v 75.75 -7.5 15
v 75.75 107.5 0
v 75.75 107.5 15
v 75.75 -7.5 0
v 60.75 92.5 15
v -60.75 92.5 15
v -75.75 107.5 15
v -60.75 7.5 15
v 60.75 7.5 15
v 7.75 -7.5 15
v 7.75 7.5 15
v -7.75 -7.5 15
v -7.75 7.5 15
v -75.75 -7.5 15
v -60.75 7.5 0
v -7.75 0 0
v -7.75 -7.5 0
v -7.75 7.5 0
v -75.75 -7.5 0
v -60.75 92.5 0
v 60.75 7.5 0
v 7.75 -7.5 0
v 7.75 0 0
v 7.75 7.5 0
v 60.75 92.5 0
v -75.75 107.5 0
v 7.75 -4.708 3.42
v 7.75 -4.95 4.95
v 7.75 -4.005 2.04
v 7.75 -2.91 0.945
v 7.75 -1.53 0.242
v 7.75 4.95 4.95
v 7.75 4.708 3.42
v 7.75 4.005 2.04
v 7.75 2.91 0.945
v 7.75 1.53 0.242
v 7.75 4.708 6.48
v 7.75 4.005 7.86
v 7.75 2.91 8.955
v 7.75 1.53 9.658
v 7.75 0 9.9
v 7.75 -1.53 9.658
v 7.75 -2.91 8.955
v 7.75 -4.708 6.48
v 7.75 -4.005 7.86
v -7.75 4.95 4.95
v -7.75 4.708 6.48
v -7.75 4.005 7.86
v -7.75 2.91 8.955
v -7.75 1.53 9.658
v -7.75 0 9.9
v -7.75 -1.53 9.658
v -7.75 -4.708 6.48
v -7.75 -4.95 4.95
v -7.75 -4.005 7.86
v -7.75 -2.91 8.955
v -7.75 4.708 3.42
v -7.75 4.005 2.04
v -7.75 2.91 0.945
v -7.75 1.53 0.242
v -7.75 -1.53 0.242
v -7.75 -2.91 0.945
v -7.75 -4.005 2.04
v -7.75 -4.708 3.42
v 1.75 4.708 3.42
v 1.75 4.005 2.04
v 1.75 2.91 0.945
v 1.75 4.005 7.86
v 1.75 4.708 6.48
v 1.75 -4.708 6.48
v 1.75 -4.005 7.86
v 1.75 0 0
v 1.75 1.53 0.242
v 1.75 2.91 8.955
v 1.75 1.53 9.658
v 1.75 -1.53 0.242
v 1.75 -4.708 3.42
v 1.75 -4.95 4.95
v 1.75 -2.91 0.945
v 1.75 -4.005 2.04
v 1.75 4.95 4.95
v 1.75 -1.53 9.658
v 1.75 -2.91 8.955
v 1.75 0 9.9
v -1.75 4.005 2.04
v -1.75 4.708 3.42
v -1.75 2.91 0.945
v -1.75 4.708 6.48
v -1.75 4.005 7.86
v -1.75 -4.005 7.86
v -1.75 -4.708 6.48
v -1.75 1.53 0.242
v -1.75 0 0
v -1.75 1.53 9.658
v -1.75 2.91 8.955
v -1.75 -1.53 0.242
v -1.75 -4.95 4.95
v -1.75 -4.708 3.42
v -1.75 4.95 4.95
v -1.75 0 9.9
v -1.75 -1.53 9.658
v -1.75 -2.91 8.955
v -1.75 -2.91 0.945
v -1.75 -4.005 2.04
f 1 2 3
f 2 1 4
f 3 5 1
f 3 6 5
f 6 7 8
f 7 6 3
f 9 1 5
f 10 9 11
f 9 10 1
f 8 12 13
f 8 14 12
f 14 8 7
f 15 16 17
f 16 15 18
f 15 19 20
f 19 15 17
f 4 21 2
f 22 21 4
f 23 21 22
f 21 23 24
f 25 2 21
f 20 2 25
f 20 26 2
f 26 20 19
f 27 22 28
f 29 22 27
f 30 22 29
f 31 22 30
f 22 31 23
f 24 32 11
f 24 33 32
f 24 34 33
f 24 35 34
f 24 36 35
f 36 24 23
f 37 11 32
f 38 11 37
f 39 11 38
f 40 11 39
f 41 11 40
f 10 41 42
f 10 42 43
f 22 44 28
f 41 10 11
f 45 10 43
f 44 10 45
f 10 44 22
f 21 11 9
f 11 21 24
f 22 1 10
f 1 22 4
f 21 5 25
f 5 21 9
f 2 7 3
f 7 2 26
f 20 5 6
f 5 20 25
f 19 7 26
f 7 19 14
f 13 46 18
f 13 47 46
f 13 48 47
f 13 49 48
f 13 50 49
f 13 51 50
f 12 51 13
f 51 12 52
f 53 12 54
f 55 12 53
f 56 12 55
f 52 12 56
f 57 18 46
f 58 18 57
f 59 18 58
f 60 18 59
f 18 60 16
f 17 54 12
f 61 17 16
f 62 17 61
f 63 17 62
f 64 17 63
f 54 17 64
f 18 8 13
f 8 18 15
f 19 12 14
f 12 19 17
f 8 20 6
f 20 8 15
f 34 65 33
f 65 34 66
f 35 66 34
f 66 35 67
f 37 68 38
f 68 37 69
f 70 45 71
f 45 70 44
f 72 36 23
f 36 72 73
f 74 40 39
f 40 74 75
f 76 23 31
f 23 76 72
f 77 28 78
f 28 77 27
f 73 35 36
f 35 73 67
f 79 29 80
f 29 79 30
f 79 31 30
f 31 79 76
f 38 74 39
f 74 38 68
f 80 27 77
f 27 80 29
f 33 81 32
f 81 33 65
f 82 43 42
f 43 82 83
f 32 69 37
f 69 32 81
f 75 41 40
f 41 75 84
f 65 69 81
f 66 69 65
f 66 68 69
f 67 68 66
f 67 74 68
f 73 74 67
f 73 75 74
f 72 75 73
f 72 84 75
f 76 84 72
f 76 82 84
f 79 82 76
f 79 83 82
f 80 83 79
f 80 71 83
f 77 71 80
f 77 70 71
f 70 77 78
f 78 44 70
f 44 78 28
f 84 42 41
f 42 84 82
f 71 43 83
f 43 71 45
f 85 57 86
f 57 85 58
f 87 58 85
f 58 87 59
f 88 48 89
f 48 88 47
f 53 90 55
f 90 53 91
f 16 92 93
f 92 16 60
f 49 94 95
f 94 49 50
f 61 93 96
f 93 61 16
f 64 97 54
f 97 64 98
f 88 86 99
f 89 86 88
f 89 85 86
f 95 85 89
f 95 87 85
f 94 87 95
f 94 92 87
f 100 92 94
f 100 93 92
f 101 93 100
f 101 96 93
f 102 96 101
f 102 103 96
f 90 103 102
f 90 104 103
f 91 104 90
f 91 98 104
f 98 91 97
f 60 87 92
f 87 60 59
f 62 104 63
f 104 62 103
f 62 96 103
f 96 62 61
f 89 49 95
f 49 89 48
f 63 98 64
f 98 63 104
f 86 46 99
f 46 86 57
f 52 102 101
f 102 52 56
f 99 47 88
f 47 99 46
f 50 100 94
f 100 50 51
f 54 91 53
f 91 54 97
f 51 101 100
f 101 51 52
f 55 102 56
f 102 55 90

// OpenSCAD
module fitting(length, radius) {
    rotate([0,90,0])
    translate([-abs(radius), 0, 0])
        cylinder(h=length, r=radius, $fn=20);
}

module half_rod(size, rod_1_len, rod_2_len, rod_3_len) {
    radius = -size / 2;

    // Connected to fitting
    translate([0, radius, 0])
        cube([rod_1_len, size, size]);

    // Connector of fitting rod and long rod
    translate([rod_1_len, radius, 0])
    rotate([0, 0, 90])
        cube([rod_2_len, size, size]);

    // Long rod
    translate([rod_1_len, rod_2_len + radius, 0])
    rotate([0, 0, 180])
        cube([rod_3_len, size, size]);
}

gap = 3.5 / 2;

fitting_length = 6;
fitting_radius = 9.9 / 2;
rod_size = 15;
rod_1_len = 68;
rod_2_len = 115;
rod_3_len = rod_1_len + fitting_length + gap;


// Left Fitting
translate([gap, 0, 0])
    fitting(fitting_length, fitting_radius);

// Left Half Rod
translate([fitting_length + gap, 0, 0])
    half_rod(rod_size,
        rod_1_len=rod_1_len,
        rod_2_len=rod_2_len,
        rod_3_len=rod_3_len);

// Right Fitting
translate([-fitting_length - gap, 0, 0])
    fitting(fitting_length, fitting_radius);

// Right Half Rod
rotate([0, 180, 0])
translate([fitting_length + gap, 0, -rod_size])
    half_rod(rod_size,
        rod_1_len=rod_1_len,
        rod_2_len=rod_2_len,
        rod_3_len=rod_3_len);
